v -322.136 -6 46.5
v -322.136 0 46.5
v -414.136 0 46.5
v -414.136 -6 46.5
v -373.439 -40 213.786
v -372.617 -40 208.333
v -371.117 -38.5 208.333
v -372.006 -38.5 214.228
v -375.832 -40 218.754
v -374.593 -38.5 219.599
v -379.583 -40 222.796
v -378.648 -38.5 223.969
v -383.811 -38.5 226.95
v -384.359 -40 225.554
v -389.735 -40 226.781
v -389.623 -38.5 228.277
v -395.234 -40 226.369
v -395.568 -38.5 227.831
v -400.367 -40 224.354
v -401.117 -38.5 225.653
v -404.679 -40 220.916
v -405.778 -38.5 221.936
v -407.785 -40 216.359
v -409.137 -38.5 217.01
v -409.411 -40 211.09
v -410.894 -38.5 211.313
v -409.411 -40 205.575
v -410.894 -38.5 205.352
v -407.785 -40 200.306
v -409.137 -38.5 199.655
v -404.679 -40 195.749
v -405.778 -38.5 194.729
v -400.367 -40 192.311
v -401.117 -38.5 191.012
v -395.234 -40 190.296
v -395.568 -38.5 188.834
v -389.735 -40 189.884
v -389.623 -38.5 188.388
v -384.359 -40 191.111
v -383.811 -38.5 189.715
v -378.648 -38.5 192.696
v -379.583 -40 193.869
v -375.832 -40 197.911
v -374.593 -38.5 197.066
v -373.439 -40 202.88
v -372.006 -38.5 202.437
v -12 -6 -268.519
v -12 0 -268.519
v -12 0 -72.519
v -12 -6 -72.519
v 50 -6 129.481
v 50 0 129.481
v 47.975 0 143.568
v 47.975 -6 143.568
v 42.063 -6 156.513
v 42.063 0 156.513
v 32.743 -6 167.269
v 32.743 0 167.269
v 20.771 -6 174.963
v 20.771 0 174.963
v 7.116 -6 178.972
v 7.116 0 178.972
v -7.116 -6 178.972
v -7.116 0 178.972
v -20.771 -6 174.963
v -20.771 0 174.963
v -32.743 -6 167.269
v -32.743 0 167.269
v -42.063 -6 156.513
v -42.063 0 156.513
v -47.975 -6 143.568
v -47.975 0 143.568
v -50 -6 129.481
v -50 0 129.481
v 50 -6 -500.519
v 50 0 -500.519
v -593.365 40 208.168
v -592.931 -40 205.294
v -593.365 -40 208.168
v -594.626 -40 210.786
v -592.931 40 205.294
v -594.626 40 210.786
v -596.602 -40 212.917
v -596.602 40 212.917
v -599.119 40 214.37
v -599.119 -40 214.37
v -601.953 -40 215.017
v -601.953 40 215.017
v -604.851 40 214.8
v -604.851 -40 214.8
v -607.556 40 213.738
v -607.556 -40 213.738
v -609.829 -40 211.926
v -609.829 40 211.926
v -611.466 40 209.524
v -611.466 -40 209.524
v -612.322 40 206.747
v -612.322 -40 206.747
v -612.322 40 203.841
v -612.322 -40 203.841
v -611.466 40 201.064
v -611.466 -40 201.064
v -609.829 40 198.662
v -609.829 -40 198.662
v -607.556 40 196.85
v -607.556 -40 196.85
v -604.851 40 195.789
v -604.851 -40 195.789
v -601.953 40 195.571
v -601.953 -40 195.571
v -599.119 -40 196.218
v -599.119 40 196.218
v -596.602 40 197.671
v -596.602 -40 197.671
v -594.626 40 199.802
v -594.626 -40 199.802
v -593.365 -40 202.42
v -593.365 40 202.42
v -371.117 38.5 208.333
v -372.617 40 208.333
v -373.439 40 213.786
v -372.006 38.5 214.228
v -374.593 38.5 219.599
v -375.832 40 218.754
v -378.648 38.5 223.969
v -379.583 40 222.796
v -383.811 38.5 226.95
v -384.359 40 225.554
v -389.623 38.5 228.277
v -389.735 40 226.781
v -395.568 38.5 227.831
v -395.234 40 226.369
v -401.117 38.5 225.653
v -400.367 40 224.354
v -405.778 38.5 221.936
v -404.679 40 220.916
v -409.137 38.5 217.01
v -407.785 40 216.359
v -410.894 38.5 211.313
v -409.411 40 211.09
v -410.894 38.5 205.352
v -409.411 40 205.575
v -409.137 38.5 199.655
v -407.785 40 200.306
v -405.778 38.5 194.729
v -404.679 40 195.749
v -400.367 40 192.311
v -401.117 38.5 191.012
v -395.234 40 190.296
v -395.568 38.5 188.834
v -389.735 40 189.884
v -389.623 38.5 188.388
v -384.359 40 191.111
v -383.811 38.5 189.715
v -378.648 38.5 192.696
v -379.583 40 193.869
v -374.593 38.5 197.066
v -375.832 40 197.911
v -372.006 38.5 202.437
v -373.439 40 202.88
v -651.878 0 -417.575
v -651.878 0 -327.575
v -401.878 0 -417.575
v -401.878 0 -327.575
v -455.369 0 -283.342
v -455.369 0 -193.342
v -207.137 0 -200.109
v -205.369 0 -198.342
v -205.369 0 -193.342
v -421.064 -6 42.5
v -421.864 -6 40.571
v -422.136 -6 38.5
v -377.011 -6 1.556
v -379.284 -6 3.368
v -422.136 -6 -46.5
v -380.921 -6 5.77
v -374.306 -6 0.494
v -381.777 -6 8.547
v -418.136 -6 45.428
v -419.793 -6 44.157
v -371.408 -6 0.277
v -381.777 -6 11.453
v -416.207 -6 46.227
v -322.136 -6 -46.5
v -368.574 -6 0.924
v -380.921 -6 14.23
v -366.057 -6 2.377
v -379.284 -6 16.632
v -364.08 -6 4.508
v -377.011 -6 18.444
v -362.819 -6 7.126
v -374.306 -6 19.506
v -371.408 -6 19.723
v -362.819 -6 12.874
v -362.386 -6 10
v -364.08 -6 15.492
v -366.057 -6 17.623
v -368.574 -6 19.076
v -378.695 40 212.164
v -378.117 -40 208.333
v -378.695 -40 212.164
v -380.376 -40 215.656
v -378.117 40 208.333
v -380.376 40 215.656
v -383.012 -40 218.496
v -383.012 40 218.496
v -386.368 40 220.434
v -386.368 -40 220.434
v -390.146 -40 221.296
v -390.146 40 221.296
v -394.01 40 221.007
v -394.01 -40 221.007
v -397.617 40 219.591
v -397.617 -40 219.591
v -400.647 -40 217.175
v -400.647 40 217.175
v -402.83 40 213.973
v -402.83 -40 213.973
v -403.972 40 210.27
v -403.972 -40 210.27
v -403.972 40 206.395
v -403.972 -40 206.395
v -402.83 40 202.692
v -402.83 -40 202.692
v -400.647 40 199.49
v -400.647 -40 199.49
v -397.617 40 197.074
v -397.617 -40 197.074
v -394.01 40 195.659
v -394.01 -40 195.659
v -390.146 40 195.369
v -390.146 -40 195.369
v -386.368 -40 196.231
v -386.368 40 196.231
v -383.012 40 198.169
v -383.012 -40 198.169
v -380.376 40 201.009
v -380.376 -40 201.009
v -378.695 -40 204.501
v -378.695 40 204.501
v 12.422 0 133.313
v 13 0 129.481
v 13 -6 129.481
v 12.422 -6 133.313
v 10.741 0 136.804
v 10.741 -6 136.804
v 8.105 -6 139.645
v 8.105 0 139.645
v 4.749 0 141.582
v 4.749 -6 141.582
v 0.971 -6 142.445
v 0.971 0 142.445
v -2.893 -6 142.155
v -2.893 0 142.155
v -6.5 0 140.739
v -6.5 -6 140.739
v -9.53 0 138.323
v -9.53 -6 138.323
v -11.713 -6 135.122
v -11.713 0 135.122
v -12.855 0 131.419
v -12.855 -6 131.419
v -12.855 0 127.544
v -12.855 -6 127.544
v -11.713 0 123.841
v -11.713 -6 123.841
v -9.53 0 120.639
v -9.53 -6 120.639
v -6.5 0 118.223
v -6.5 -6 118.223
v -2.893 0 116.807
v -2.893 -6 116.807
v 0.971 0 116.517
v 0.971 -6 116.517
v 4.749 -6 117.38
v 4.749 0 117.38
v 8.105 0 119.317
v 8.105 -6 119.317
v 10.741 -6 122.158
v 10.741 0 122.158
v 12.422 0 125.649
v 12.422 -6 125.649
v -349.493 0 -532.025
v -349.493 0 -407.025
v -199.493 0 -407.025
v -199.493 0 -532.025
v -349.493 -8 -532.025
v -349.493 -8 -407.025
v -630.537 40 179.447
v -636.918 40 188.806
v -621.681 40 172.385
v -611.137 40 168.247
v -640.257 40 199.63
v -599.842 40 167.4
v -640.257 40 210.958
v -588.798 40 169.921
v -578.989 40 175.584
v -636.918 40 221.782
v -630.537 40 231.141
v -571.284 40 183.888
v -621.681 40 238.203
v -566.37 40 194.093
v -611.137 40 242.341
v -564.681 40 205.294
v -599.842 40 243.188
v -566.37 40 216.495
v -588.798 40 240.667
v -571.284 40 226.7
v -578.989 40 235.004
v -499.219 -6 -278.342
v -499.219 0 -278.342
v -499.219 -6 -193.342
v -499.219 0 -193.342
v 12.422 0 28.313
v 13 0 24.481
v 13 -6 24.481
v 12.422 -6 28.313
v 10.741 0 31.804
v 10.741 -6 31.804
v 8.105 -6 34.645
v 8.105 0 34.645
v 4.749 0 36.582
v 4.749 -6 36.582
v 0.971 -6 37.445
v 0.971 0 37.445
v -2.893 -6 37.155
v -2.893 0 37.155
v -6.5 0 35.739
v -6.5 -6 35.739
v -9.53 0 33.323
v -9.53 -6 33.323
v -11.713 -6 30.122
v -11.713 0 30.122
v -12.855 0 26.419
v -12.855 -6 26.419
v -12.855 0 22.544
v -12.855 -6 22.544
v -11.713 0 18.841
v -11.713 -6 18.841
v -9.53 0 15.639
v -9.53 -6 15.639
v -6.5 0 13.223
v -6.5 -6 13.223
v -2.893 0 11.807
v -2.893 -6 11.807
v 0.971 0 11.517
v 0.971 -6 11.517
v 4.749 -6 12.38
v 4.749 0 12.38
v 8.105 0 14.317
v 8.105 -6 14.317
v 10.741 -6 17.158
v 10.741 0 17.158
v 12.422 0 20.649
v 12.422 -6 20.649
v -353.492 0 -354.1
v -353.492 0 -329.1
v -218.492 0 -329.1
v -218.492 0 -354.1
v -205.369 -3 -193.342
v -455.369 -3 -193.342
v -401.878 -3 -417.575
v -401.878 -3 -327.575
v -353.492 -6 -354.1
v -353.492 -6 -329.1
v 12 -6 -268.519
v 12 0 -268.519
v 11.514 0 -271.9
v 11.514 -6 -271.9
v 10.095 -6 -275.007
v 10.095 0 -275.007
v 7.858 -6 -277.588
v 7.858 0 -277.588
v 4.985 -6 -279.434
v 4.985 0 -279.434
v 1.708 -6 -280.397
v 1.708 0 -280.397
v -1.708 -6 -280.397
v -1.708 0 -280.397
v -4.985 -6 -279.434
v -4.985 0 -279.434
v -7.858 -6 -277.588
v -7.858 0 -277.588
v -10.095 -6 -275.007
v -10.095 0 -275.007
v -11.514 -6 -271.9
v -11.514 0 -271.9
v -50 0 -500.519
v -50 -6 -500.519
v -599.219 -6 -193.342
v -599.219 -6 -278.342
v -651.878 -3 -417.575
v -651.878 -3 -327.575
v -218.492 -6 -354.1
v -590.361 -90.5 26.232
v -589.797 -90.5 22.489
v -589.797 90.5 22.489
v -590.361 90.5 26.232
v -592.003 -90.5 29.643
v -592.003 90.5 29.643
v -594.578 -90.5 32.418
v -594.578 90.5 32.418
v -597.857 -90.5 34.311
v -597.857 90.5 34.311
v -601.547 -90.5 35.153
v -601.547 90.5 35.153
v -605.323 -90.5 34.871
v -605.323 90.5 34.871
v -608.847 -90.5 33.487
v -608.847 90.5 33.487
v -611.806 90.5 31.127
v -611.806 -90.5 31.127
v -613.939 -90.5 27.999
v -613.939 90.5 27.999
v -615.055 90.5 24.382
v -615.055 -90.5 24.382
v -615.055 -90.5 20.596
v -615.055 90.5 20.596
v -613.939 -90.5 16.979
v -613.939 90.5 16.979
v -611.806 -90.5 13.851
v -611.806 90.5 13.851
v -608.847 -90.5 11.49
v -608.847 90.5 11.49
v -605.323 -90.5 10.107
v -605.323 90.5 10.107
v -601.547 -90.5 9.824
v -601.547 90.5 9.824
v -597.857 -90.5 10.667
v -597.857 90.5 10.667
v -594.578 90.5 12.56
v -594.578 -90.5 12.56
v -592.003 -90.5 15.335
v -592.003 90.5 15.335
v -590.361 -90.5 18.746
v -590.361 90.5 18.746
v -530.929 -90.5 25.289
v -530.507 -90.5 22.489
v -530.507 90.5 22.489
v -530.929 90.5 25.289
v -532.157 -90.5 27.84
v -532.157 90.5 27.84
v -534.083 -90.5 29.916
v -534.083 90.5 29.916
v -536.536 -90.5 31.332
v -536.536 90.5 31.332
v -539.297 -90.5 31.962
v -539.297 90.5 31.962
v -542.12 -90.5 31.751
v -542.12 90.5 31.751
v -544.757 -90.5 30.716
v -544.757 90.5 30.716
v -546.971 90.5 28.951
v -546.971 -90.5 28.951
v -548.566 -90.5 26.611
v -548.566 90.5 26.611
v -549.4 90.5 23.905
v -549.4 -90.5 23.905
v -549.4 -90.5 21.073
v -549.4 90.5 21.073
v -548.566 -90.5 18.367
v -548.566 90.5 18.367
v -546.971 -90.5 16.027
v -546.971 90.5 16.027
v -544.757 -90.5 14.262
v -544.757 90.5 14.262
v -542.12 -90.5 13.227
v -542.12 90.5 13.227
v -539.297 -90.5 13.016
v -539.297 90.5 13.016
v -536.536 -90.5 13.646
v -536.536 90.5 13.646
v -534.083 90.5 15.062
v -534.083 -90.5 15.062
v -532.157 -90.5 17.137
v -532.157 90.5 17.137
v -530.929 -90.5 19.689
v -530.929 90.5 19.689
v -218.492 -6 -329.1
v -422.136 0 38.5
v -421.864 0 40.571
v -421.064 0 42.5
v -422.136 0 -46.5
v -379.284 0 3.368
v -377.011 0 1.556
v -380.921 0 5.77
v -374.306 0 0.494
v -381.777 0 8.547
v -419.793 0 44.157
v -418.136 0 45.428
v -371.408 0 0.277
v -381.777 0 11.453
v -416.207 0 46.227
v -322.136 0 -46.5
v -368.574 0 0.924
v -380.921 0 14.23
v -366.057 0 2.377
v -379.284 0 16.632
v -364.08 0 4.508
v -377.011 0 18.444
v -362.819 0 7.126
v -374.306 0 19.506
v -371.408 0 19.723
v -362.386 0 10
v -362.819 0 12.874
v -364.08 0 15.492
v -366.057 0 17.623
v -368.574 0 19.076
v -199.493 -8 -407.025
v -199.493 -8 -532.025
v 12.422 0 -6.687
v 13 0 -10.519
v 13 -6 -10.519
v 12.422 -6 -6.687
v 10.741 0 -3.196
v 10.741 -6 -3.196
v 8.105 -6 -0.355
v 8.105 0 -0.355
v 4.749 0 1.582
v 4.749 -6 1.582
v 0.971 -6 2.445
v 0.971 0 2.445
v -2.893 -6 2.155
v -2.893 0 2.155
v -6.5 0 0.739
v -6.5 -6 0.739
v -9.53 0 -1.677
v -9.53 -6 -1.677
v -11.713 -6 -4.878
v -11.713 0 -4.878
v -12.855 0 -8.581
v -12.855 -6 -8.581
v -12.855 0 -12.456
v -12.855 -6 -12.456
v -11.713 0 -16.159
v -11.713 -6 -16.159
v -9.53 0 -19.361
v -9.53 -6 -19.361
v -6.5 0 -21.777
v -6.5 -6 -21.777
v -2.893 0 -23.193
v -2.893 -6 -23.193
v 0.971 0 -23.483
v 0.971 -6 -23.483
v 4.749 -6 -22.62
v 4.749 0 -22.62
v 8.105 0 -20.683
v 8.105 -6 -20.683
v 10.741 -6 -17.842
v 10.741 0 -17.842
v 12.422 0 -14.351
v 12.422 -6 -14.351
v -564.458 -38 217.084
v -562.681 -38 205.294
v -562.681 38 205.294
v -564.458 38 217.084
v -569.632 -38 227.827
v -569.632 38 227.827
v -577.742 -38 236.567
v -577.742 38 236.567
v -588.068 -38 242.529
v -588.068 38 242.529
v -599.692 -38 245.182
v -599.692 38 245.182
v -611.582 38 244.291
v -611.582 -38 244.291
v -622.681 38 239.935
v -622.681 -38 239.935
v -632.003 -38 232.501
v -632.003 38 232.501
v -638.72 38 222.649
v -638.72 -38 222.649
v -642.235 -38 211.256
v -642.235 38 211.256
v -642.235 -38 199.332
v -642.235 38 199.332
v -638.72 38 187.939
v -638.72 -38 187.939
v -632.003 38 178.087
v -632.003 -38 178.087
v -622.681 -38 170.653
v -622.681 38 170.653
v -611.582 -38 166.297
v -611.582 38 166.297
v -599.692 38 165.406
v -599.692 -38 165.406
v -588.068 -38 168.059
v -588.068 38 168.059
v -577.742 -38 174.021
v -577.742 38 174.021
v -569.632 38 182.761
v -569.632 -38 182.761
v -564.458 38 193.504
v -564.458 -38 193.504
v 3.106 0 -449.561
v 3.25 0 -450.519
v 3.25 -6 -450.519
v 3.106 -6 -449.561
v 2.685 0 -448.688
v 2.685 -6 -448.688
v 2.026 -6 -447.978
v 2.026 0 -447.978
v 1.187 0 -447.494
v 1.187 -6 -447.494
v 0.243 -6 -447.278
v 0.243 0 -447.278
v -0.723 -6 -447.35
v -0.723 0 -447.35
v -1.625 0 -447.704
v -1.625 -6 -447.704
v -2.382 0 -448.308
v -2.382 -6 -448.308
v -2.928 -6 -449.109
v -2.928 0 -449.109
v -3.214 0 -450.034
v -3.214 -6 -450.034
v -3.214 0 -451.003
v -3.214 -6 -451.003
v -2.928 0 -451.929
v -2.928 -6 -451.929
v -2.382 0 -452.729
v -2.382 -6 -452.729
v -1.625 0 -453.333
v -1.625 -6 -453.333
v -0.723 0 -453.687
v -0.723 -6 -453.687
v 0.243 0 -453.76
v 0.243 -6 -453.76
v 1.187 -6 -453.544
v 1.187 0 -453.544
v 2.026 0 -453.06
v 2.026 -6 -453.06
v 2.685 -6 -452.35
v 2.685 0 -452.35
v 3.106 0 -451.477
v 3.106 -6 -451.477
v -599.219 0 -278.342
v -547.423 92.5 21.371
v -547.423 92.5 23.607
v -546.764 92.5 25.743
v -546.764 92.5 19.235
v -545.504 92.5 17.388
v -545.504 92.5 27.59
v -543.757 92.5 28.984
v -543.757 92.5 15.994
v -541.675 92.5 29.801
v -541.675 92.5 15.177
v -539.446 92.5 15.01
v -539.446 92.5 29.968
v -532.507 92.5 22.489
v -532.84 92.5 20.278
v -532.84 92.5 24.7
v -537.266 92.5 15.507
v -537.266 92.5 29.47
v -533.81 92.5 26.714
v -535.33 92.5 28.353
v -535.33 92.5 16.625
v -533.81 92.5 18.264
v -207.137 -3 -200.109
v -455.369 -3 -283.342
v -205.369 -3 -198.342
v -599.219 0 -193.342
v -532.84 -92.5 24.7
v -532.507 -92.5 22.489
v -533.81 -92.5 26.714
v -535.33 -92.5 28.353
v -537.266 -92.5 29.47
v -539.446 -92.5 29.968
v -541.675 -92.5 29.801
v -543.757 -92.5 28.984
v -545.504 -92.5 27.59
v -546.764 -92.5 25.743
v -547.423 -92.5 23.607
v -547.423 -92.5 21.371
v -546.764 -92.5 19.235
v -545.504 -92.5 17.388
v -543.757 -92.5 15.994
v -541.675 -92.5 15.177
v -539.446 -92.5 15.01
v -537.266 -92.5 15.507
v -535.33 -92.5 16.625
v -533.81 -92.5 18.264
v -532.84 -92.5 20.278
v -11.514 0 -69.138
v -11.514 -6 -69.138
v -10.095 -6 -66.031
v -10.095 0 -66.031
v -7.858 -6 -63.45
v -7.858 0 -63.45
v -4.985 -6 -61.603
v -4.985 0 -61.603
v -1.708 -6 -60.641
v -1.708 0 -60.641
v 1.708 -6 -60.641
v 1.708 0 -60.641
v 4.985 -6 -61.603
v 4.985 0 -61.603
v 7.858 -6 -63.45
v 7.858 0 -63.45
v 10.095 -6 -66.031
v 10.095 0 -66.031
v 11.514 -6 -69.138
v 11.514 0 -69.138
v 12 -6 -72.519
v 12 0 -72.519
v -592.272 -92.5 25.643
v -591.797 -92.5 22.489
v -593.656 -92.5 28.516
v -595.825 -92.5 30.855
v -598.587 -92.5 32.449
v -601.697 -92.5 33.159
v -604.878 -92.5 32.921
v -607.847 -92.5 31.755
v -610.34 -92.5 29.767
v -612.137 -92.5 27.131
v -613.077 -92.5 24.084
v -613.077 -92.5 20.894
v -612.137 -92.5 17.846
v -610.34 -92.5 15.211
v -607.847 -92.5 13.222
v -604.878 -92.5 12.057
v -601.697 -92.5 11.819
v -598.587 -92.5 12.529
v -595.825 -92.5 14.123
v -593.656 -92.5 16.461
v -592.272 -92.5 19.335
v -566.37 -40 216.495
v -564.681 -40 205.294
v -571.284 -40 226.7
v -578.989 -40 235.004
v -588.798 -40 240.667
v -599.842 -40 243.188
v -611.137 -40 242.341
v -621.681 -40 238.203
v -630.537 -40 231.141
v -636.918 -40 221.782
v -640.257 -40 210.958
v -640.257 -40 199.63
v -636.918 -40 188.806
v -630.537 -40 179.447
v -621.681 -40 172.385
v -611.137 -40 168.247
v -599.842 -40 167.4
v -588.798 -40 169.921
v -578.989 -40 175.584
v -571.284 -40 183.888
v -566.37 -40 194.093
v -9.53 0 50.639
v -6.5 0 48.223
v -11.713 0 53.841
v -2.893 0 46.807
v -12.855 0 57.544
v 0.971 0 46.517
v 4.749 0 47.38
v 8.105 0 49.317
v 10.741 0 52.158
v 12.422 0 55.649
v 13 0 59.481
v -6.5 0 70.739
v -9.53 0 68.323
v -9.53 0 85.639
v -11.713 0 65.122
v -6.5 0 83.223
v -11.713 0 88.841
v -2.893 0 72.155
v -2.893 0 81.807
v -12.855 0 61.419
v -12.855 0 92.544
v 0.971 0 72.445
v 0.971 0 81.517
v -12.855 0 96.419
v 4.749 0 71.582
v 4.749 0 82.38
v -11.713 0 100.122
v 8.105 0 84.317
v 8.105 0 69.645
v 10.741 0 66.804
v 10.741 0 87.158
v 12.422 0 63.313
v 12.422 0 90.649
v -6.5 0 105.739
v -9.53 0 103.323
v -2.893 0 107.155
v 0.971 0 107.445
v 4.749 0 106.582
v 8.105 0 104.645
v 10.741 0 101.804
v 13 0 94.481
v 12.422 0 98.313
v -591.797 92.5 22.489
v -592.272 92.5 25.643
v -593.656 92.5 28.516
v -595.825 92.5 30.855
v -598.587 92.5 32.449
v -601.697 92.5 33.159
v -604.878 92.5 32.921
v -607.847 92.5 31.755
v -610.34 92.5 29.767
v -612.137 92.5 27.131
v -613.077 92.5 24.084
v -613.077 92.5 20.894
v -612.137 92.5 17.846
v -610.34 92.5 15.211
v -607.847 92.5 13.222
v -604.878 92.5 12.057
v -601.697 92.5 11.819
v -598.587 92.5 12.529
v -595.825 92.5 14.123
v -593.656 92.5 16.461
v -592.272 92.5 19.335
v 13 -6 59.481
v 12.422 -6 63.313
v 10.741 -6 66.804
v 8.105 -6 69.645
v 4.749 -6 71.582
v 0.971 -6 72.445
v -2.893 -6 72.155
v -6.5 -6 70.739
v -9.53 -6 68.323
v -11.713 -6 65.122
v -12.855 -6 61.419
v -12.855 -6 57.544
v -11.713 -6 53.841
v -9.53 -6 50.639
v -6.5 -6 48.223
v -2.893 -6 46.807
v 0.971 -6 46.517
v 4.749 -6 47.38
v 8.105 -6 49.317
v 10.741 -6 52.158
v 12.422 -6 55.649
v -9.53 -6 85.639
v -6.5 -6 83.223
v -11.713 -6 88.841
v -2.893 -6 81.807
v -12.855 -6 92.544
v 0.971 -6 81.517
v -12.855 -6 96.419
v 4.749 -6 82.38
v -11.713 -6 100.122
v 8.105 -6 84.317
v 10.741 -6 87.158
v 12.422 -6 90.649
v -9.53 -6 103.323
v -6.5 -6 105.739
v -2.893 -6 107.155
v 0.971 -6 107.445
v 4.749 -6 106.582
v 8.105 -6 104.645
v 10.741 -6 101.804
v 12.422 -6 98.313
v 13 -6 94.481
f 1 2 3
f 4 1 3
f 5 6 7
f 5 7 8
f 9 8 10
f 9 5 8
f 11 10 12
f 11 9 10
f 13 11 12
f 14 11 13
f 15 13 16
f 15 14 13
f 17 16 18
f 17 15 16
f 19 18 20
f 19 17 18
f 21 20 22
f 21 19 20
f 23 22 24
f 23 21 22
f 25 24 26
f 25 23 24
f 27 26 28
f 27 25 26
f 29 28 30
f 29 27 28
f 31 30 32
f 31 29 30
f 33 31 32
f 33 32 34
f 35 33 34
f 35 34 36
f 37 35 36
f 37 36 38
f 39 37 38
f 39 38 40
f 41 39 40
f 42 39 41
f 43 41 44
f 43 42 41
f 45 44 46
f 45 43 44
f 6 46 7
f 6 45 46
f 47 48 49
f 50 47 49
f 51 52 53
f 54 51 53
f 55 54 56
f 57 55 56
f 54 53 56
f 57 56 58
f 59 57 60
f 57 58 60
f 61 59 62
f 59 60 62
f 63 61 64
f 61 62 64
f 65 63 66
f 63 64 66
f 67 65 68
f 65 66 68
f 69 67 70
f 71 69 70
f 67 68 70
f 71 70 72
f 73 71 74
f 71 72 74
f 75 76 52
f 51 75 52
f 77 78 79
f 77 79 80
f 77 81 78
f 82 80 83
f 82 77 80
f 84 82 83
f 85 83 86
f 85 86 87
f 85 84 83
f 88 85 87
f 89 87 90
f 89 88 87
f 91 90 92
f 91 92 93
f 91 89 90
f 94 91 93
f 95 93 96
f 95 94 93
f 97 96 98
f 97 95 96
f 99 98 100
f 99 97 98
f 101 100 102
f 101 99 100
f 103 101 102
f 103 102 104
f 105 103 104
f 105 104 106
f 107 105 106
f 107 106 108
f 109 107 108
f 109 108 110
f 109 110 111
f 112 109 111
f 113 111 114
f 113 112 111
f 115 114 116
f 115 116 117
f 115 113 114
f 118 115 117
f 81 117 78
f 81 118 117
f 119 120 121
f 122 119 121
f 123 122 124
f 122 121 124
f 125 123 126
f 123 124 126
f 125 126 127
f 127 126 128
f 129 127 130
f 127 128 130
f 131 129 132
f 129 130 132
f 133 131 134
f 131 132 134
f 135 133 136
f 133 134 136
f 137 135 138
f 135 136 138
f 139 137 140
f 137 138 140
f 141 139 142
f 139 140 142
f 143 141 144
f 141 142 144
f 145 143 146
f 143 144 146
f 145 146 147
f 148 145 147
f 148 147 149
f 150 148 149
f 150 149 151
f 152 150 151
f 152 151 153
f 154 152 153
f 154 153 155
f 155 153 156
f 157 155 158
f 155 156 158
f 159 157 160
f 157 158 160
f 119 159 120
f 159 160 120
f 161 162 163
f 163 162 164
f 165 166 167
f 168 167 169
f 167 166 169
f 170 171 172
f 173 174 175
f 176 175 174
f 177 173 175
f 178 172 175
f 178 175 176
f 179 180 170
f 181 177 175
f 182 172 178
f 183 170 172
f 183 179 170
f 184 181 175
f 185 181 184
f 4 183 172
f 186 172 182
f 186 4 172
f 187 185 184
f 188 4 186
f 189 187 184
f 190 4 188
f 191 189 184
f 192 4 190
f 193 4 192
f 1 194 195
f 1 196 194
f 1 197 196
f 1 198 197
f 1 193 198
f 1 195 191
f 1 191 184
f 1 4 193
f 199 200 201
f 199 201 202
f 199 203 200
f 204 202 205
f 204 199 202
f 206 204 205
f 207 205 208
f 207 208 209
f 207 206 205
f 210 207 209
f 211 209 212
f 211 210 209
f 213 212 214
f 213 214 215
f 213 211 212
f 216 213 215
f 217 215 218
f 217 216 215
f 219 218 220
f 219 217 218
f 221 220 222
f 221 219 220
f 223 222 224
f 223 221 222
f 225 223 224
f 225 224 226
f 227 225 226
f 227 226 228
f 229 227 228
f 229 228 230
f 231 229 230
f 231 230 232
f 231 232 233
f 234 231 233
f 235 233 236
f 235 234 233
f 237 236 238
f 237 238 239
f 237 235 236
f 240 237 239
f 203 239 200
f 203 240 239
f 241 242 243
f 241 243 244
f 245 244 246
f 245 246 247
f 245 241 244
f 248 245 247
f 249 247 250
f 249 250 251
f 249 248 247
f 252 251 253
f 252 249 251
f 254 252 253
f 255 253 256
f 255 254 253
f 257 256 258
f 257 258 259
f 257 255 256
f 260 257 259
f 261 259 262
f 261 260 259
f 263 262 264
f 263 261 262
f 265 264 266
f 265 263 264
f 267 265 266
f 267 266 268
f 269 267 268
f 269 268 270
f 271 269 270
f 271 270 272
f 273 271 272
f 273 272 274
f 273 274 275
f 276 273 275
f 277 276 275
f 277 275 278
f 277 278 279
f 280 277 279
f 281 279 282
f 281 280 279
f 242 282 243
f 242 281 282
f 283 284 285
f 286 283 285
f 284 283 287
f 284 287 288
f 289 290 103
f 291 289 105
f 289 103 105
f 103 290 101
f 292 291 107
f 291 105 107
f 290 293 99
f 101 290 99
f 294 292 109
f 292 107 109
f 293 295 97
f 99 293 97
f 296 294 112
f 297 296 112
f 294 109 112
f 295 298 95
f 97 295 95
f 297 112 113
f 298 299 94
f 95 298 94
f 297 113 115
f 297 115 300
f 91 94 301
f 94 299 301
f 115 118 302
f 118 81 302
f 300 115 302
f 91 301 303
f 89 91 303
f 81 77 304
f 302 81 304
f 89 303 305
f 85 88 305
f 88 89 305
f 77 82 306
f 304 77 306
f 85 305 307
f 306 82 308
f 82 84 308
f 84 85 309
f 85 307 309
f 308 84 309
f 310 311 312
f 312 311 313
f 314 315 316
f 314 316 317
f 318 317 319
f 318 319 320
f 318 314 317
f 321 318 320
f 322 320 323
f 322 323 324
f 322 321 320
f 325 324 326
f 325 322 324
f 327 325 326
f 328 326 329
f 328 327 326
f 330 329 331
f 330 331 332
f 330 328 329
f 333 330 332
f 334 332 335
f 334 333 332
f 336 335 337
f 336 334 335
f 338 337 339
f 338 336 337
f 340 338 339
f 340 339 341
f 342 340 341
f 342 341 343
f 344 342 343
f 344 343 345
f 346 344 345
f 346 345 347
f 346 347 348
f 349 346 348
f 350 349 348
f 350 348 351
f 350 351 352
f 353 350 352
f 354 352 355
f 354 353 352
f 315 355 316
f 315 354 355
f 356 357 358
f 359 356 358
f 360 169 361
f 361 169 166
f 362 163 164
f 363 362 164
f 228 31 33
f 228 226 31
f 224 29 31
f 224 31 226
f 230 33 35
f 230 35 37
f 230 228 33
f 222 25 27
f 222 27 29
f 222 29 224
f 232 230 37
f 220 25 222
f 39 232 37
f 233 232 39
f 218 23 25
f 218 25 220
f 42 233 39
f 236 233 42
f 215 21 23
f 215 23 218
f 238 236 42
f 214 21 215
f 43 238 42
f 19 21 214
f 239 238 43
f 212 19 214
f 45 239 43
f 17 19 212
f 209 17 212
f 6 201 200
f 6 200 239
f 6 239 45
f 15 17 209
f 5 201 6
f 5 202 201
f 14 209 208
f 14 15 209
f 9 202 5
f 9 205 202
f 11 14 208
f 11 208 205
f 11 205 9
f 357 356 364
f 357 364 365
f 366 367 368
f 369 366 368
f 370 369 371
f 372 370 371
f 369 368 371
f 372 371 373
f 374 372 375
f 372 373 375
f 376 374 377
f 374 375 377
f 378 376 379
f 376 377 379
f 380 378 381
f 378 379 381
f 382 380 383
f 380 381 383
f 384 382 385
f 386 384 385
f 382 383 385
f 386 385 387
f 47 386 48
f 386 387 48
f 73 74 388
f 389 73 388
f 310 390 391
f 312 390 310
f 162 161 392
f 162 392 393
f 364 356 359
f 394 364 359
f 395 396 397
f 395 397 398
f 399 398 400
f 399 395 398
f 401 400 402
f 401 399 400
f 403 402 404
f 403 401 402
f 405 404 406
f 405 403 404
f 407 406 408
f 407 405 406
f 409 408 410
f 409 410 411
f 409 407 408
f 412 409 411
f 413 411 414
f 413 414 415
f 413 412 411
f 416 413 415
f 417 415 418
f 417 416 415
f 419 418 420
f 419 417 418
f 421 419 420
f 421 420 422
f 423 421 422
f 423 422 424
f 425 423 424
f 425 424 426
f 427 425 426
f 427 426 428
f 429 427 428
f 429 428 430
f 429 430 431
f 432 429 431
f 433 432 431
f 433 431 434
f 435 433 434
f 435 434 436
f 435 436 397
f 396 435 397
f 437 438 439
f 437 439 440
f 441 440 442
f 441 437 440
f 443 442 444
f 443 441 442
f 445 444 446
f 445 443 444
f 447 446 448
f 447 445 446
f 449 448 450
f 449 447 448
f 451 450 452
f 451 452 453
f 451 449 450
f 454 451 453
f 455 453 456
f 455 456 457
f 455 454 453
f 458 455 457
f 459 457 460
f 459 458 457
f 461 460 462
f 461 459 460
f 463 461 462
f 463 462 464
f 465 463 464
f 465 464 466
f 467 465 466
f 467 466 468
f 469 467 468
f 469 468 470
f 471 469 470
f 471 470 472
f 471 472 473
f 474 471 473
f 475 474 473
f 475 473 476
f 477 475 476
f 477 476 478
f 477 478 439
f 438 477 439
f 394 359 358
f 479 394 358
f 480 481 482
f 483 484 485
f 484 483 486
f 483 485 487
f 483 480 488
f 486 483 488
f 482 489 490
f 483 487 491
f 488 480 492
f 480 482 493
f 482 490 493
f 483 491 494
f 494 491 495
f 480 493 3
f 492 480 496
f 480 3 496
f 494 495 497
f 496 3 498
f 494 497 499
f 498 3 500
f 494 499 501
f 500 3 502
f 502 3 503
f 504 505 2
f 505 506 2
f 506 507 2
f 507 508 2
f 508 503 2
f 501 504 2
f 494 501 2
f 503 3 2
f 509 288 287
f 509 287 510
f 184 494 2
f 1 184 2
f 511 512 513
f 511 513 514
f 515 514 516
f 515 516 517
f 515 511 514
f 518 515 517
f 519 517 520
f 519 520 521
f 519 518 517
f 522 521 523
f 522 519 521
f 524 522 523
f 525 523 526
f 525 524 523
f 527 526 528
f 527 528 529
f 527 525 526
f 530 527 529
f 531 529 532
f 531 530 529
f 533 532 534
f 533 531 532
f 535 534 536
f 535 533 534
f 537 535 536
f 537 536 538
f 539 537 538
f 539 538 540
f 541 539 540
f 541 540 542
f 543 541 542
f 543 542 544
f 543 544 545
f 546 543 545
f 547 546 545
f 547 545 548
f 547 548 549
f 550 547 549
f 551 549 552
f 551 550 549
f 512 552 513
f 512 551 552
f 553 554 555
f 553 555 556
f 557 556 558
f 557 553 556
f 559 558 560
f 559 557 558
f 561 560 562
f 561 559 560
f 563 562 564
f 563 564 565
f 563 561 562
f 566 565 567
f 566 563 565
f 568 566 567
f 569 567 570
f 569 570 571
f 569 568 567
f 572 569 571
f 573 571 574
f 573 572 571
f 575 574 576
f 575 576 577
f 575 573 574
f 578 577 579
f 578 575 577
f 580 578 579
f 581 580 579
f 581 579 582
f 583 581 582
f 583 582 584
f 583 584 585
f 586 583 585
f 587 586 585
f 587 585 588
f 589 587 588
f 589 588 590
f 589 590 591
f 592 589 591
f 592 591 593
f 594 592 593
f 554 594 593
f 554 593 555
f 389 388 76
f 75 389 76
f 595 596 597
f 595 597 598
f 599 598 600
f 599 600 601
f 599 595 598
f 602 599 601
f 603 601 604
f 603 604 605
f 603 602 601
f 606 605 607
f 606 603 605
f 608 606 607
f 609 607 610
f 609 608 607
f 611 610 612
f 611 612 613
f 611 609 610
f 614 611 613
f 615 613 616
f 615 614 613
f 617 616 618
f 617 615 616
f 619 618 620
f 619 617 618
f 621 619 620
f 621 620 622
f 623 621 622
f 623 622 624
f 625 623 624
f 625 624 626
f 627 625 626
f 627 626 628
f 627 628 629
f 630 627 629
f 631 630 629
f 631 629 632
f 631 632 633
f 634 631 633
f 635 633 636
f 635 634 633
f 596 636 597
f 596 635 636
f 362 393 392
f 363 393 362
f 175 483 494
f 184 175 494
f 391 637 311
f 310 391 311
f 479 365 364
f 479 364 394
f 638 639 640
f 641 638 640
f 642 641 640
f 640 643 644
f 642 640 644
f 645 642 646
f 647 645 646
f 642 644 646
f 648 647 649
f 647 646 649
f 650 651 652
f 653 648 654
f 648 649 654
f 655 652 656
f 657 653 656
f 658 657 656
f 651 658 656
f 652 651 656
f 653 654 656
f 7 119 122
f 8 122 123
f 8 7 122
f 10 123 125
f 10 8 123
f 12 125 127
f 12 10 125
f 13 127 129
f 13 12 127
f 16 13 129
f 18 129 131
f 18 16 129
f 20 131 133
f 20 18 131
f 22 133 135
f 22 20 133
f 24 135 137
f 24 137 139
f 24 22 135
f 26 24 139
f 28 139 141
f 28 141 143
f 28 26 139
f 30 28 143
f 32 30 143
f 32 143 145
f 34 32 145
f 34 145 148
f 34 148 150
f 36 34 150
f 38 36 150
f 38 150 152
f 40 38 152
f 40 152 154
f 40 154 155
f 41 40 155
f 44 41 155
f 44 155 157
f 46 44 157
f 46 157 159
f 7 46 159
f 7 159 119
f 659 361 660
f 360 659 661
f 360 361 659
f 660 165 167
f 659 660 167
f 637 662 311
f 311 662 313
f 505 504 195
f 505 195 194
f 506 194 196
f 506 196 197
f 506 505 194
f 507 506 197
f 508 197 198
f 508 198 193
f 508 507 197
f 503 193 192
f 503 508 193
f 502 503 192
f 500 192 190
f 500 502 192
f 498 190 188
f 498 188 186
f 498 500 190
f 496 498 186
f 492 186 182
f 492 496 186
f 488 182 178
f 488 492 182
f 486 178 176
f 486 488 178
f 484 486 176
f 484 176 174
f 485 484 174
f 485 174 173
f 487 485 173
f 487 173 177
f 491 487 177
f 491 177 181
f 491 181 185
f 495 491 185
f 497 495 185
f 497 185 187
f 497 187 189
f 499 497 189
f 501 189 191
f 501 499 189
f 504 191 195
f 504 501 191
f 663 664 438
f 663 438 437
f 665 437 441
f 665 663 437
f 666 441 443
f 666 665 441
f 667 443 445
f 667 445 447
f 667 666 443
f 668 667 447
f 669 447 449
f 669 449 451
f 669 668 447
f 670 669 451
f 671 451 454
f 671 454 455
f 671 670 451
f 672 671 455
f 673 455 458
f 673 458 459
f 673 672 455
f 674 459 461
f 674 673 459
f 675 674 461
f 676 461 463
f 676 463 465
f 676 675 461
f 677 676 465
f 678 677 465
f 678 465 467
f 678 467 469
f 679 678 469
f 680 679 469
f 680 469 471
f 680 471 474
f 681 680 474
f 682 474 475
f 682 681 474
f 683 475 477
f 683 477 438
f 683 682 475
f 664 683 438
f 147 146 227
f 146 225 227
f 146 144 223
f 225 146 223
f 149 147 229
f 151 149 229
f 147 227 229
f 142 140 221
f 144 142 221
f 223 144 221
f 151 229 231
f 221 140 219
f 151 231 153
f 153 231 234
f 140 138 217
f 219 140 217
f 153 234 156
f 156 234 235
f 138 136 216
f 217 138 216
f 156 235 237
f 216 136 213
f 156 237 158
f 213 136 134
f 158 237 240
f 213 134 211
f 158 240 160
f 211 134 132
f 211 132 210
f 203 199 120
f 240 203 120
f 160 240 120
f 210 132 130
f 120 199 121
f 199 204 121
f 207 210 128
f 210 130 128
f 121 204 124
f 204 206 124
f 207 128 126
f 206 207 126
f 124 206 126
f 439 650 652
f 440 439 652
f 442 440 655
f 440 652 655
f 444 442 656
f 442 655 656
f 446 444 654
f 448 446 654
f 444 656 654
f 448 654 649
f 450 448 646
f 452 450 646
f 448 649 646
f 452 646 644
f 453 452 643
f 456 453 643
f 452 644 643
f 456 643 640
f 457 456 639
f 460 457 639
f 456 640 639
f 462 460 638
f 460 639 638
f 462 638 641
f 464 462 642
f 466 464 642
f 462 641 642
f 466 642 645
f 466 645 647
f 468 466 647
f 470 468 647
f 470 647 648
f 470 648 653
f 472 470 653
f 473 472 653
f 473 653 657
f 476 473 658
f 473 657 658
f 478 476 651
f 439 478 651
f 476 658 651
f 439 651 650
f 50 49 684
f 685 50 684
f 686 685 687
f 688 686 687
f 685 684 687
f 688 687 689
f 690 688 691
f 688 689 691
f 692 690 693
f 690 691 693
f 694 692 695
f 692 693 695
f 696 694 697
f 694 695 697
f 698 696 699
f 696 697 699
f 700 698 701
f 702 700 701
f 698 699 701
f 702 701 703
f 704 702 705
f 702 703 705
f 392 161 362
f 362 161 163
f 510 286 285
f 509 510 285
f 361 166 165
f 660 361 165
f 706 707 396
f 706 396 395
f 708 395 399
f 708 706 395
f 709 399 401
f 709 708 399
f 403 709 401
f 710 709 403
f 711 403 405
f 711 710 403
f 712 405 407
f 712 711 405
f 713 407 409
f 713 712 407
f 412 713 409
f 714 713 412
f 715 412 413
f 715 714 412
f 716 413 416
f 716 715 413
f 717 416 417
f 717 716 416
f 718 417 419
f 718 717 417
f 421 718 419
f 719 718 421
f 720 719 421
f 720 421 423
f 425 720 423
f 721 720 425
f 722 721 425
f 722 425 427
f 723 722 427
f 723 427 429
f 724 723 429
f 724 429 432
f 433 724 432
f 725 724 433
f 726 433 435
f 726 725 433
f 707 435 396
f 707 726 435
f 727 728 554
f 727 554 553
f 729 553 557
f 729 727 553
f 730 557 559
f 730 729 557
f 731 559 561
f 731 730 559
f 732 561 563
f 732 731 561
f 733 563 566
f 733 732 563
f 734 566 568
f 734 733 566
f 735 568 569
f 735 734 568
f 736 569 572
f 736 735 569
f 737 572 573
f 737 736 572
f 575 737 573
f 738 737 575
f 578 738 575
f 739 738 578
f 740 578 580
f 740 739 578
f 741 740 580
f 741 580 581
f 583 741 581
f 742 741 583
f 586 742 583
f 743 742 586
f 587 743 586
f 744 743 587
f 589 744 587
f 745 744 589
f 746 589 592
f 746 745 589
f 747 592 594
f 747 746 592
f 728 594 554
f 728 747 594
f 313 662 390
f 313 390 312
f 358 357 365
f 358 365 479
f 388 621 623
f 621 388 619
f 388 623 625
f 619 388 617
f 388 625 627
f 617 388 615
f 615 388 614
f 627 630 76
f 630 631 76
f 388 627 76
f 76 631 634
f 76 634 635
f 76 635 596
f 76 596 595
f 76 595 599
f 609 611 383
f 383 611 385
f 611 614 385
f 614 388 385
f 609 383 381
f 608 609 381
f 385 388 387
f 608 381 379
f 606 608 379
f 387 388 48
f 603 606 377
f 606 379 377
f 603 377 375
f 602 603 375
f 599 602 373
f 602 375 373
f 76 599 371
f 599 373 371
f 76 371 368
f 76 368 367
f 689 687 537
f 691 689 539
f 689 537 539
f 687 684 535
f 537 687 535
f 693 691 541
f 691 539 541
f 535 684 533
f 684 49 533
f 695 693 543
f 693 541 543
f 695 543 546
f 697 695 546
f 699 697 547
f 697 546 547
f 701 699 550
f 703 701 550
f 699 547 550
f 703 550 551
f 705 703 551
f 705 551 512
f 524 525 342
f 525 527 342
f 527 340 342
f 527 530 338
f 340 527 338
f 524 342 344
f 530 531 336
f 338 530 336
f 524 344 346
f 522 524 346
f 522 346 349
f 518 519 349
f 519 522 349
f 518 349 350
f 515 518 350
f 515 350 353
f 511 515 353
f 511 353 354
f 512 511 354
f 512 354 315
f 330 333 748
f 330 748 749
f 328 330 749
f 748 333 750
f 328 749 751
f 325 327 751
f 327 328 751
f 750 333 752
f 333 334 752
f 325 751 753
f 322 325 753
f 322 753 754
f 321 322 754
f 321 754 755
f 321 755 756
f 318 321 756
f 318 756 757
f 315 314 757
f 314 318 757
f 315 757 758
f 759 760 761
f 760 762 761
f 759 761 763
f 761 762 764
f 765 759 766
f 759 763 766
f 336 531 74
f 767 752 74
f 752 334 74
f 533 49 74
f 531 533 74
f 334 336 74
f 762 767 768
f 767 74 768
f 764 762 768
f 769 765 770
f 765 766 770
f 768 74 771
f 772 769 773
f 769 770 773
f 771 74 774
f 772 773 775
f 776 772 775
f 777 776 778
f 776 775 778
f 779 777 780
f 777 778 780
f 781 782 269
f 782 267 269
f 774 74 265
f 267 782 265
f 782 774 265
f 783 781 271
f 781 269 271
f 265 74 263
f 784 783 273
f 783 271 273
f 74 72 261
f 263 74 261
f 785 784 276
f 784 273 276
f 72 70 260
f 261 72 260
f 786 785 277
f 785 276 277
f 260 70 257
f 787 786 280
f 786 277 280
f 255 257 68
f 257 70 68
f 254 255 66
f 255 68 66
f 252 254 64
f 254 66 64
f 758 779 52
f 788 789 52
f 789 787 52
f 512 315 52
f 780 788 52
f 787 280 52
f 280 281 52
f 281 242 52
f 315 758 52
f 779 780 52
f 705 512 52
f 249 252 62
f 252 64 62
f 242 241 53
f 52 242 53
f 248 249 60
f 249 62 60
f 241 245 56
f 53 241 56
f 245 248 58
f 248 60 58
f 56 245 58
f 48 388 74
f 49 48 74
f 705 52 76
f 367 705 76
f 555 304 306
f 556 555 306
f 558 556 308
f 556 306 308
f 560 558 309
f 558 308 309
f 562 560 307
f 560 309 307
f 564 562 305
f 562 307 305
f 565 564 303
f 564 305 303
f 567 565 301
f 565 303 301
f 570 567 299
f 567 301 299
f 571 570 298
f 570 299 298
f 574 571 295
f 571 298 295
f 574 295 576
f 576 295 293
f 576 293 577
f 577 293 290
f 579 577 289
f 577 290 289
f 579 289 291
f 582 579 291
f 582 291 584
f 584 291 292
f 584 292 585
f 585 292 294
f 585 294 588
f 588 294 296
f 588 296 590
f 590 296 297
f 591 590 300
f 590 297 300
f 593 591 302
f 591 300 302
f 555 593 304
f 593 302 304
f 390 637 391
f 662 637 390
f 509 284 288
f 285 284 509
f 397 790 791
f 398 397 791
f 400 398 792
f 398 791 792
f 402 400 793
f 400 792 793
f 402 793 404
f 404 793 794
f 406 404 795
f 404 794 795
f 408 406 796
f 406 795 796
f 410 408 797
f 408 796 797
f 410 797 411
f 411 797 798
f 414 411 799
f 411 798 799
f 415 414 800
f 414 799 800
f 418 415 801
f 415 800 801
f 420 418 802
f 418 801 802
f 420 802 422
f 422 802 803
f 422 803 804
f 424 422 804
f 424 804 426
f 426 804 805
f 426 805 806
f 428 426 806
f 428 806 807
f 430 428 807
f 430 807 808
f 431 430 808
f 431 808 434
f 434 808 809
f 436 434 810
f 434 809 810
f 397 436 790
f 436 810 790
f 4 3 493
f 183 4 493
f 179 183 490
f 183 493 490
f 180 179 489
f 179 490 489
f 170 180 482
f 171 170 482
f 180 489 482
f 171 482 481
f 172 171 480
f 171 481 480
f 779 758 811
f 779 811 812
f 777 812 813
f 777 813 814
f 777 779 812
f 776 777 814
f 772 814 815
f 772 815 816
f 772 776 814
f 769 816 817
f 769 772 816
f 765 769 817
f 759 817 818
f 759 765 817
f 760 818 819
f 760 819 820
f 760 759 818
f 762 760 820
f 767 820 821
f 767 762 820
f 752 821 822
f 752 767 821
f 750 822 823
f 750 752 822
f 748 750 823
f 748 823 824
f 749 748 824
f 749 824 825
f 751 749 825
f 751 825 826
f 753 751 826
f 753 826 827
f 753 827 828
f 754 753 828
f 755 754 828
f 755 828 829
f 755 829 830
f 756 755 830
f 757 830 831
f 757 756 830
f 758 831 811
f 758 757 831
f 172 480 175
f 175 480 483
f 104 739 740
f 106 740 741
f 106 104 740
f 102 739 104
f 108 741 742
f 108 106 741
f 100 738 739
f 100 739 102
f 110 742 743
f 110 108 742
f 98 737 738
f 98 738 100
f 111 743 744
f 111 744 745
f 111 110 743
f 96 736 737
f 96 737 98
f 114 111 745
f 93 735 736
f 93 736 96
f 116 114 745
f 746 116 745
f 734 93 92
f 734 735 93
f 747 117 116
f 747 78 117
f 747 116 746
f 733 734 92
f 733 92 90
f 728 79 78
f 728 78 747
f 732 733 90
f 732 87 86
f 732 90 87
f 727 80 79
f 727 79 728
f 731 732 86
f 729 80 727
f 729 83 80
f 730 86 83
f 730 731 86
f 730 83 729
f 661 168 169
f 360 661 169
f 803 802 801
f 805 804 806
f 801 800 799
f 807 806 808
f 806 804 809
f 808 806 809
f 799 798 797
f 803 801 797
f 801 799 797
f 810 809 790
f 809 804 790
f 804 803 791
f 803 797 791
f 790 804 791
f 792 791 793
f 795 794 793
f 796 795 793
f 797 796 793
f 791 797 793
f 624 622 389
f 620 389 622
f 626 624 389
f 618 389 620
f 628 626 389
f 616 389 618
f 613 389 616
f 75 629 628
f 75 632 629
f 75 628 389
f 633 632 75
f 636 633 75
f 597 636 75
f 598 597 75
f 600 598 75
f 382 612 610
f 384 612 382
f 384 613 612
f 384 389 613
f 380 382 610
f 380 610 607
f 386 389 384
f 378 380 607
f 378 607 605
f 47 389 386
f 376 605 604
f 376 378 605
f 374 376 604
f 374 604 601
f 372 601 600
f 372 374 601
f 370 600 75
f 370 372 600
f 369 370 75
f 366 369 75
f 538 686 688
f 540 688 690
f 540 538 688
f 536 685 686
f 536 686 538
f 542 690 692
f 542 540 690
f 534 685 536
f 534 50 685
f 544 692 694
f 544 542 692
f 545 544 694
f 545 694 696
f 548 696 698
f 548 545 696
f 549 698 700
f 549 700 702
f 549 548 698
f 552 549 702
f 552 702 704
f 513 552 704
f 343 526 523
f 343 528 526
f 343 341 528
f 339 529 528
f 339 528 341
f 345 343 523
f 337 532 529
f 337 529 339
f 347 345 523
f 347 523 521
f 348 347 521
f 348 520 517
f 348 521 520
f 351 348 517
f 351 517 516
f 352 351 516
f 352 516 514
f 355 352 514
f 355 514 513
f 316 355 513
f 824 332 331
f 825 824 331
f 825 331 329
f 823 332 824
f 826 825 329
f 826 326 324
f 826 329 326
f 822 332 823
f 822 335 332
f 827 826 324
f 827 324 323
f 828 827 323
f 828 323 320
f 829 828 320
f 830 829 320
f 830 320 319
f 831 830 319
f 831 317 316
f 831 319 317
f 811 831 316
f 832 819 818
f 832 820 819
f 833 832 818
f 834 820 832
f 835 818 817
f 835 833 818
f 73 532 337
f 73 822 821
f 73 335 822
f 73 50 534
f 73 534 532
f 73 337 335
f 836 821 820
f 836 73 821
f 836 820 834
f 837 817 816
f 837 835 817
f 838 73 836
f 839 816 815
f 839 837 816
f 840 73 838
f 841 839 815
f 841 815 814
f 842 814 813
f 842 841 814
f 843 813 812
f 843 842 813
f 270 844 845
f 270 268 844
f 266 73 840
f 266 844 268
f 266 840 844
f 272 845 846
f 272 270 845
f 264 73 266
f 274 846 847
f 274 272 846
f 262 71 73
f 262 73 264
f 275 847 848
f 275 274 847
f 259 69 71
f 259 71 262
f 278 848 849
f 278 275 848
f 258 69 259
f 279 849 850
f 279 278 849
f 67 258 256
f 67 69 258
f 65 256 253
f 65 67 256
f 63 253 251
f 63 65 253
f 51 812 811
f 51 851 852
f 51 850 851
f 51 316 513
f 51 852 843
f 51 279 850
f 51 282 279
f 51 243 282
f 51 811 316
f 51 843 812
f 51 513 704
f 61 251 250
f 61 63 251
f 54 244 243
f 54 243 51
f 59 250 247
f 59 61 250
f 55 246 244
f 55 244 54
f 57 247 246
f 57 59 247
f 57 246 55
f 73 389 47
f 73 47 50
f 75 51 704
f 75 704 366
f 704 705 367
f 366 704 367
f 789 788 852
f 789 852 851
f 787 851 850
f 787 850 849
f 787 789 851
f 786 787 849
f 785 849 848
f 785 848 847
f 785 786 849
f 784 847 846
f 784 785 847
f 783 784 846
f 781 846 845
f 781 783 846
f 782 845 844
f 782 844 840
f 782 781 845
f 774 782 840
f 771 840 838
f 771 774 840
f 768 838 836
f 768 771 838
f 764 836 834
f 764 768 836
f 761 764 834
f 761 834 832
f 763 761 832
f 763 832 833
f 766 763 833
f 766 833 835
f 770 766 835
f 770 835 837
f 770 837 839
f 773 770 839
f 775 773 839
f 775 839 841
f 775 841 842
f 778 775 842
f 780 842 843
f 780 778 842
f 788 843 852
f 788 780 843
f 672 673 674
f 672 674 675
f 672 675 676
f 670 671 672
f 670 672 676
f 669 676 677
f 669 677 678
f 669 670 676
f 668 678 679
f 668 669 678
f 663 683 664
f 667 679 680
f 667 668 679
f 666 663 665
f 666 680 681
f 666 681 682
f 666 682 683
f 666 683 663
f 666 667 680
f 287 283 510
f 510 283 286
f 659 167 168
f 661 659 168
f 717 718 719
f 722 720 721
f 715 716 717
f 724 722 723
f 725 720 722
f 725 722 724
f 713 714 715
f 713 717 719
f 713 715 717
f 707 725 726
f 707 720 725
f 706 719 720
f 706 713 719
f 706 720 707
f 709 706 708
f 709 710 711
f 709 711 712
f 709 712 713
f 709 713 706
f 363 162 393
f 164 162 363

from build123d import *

# Parameters (mm, degrees)
F0_R      = 3.25
F0_R_2    = 13
F1_DEPTH  = 6
F0_R_3    = 20
F2_DEPTH  = 40
F3_SIZE   = 1.5
F0_R_4    = 40
F0_R_5    = 9.75
F4_DEPTH  = 40
F5_SIZE   = 2
F0_R_6    = 12.7
F6_DEPTH  = 92.5
F0_R_7    = 9.5
F7_DEPTH  = 92.5
F8_SIZE   = 2
F9_SIZE   = 2
F10_DEPTH = 6
F0_W      = 150
F0_H      = 125
F11_DEPTH = 8
F0_W_2    = 135
F0_H_2    = 25
F12_DEPTH = 6
F13_DEPTH = 3
F0_W_3    = 100
F0_H_3    = 85
F14_DEPTH = 6
F0_W_4    = 250
F0_H_4    = 90
F15_DEPTH = 3


with BuildPart() as f1:
    # F0 (on Front) → F1 (new body)
    with BuildSketch(Plane.XZ):
        with BuildLine():
            Line((-50, 129.481139), (-50, -500.518861))
            Line((-50, -500.518861), (50, -500.518861))
            Line((50, -500.518861), (50, 129.481139))
            ThreePointArc((50, 129.481139), (0, 179.481139), (-50, 129.481139))
        make_face()
        with Locations((0, -450.518861)):
            Circle(F0_R, mode=Mode.SUBTRACT)
        with BuildLine():
            Line((-12, -268.518861), (-12, -72.518861))
            ThreePointArc((-12, -72.518861), (0, -60.518861), (12, -72.518861))
            Line((12, -72.518861), (12, -268.518861))
            ThreePointArc((12, -268.518861), (0, -280.518861), (-12, -268.518861))
        make_face(mode=Mode.SUBTRACT)
        with Locations((0, -10.518861)):
            Circle(F0_R_2, mode=Mode.SUBTRACT)
        with Locations((0, 24.481139)):
            Circle(F0_R_2, mode=Mode.SUBTRACT)
        with Locations((0, 59.481139)):
            Circle(F0_R_2, mode=Mode.SUBTRACT)
        with Locations((0, 94.481139)):
            Circle(F0_R_2, mode=Mode.SUBTRACT)
        with Locations((0, 129.481139)):
            Circle(F0_R_2, mode=Mode.SUBTRACT)
    extrude(amount=F1_DEPTH)


with BuildPart() as f2:
    # F0 (on Front) → F2 (new body, symmetric)
    with BuildSketch(Plane.XZ):
        with Locations((-391.117364, 208.332568)):
            Circle(F0_R_3)
        with Locations((-391.117364, 208.332568)):
            Circle(F0_R_2, mode=Mode.SUBTRACT)
    extrude(amount=F2_DEPTH, both=True)

    # F3
    f3_edges = [f2.edges().sort_by_distance(p)[0] for p in [
        (-411.117364, -40, 208.332568),
        (-411.117364, 40, 208.332568),
    ]]
    chamfer(f3_edges, length=F3_SIZE)


with BuildPart() as f4:
    # F0 (on Front) → F4 (new body, symmetric)
    with BuildSketch(Plane.XZ):
        with Locations((-602.681398, 205.294058)):
            Circle(F0_R_4)
        with Locations((-602.681398, 205.294058)):
            Circle(F0_R_5, mode=Mode.SUBTRACT)
    extrude(amount=F4_DEPTH, both=True)

    # F5
    f5_edges = [f4.edges().sort_by_distance(p)[0] for p in [
        (-642.681398, -40, 205.294058),
        (-642.681398, 40, 205.294058),
    ]]
    chamfer(f5_edges, length=F5_SIZE)


with BuildPart() as f6:
    # F0 (on Front) → F6 (new body, symmetric)
    with BuildSketch(Plane.XZ):
        with Locations((-602.496564, 22.488941)):
            Circle(F0_R_6)
    extrude(amount=F6_DEPTH, both=True)

    # F8
    f8_edges = [f6.edges().sort_by_distance(p)[0] for p in [
        (-615.196564, -92.5, 22.488941),
        (-615.196564, 92.5, 22.488941),
    ]]
    chamfer(f8_edges, length=F8_SIZE)


with BuildPart() as f7:
    # F0 (on Front) → F7 (new body, symmetric)
    with BuildSketch(Plane.XZ):
        with Locations((-540.006518, 22.488941)):
            Circle(F0_R_7)
    extrude(amount=F7_DEPTH, both=True)

    # F9
    f9_edges = [f7.edges().sort_by_distance(p)[0] for p in [
        (-549.506518, -92.5, 22.488941),
        (-549.506518, 92.5, 22.488941),
    ]]
    chamfer(f9_edges, length=F9_SIZE)


with BuildPart() as f10:
    # F0 (on Front) → F10 (new body)
    with BuildSketch(Plane.XZ):
        with BuildLine():
            Line((-322.136265, -46.5), (-322.136265, 46.5))
            Line((-322.136265, 46.5), (-414.136265, 46.5))
            ThreePointArc((-414.136265, 46.5), (-419.793119, 44.156854), (-422.136265, 38.5))
            Line((-422.136265, 38.5), (-422.136265, -46.5))
            Line((-422.136265, -46.5), (-322.136265, -46.5))
        make_face()
        with Locations((-372.136265, 10)):
            Circle(F0_R_5, mode=Mode.SUBTRACT)
    extrude(amount=F10_DEPTH)


with BuildPart() as f11:
    # F0 (on Front) → F11 (new body)
    with BuildSketch(Plane.XZ):
        with Locations((-274.493006, -469.52486)):
            Rectangle(F0_W, F0_H)
    extrude(amount=F11_DEPTH)


with BuildPart() as f12:
    # F0 (on Front) → F12 (new body)
    with BuildSketch(Plane.XZ):
        with Locations((-285.99215, -341.59984)):
            Rectangle(F0_W_2, F0_H_2)
    extrude(amount=F12_DEPTH)


with BuildPart() as f13:
    # F0 (on Front) → F13 (new body)
    with BuildSketch(Plane.XZ):
        Polygon((-205.369025, -193.341711), (-455.369025, -193.341711), (-455.369025, -283.341711), (-207.136792, -200.109478), (-205.369025, -198.341711), align=None)
    extrude(amount=F13_DEPTH)


with BuildPart() as f14:
    # F0 (on Front) → F14 (new body)
    with BuildSketch(Plane.XZ):
        with Locations((-549.218547, -235.841711)):
            Rectangle(F0_W_3, F0_H_3)
    extrude(amount=F14_DEPTH)


with BuildPart() as f15:
    # F0 (on Front) → F15 (new body)
    with BuildSketch(Plane.XZ):
        with Locations((-526.878327, -372.575121)):
            Rectangle(F0_W_4, F0_H_4)
    extrude(amount=F15_DEPTH)


solid = Compound([f1.part, f2.part, f4.part, f6.part, f7.part, f10.part, f11.part, f12.part, f13.part, f14.part, f15.part])
